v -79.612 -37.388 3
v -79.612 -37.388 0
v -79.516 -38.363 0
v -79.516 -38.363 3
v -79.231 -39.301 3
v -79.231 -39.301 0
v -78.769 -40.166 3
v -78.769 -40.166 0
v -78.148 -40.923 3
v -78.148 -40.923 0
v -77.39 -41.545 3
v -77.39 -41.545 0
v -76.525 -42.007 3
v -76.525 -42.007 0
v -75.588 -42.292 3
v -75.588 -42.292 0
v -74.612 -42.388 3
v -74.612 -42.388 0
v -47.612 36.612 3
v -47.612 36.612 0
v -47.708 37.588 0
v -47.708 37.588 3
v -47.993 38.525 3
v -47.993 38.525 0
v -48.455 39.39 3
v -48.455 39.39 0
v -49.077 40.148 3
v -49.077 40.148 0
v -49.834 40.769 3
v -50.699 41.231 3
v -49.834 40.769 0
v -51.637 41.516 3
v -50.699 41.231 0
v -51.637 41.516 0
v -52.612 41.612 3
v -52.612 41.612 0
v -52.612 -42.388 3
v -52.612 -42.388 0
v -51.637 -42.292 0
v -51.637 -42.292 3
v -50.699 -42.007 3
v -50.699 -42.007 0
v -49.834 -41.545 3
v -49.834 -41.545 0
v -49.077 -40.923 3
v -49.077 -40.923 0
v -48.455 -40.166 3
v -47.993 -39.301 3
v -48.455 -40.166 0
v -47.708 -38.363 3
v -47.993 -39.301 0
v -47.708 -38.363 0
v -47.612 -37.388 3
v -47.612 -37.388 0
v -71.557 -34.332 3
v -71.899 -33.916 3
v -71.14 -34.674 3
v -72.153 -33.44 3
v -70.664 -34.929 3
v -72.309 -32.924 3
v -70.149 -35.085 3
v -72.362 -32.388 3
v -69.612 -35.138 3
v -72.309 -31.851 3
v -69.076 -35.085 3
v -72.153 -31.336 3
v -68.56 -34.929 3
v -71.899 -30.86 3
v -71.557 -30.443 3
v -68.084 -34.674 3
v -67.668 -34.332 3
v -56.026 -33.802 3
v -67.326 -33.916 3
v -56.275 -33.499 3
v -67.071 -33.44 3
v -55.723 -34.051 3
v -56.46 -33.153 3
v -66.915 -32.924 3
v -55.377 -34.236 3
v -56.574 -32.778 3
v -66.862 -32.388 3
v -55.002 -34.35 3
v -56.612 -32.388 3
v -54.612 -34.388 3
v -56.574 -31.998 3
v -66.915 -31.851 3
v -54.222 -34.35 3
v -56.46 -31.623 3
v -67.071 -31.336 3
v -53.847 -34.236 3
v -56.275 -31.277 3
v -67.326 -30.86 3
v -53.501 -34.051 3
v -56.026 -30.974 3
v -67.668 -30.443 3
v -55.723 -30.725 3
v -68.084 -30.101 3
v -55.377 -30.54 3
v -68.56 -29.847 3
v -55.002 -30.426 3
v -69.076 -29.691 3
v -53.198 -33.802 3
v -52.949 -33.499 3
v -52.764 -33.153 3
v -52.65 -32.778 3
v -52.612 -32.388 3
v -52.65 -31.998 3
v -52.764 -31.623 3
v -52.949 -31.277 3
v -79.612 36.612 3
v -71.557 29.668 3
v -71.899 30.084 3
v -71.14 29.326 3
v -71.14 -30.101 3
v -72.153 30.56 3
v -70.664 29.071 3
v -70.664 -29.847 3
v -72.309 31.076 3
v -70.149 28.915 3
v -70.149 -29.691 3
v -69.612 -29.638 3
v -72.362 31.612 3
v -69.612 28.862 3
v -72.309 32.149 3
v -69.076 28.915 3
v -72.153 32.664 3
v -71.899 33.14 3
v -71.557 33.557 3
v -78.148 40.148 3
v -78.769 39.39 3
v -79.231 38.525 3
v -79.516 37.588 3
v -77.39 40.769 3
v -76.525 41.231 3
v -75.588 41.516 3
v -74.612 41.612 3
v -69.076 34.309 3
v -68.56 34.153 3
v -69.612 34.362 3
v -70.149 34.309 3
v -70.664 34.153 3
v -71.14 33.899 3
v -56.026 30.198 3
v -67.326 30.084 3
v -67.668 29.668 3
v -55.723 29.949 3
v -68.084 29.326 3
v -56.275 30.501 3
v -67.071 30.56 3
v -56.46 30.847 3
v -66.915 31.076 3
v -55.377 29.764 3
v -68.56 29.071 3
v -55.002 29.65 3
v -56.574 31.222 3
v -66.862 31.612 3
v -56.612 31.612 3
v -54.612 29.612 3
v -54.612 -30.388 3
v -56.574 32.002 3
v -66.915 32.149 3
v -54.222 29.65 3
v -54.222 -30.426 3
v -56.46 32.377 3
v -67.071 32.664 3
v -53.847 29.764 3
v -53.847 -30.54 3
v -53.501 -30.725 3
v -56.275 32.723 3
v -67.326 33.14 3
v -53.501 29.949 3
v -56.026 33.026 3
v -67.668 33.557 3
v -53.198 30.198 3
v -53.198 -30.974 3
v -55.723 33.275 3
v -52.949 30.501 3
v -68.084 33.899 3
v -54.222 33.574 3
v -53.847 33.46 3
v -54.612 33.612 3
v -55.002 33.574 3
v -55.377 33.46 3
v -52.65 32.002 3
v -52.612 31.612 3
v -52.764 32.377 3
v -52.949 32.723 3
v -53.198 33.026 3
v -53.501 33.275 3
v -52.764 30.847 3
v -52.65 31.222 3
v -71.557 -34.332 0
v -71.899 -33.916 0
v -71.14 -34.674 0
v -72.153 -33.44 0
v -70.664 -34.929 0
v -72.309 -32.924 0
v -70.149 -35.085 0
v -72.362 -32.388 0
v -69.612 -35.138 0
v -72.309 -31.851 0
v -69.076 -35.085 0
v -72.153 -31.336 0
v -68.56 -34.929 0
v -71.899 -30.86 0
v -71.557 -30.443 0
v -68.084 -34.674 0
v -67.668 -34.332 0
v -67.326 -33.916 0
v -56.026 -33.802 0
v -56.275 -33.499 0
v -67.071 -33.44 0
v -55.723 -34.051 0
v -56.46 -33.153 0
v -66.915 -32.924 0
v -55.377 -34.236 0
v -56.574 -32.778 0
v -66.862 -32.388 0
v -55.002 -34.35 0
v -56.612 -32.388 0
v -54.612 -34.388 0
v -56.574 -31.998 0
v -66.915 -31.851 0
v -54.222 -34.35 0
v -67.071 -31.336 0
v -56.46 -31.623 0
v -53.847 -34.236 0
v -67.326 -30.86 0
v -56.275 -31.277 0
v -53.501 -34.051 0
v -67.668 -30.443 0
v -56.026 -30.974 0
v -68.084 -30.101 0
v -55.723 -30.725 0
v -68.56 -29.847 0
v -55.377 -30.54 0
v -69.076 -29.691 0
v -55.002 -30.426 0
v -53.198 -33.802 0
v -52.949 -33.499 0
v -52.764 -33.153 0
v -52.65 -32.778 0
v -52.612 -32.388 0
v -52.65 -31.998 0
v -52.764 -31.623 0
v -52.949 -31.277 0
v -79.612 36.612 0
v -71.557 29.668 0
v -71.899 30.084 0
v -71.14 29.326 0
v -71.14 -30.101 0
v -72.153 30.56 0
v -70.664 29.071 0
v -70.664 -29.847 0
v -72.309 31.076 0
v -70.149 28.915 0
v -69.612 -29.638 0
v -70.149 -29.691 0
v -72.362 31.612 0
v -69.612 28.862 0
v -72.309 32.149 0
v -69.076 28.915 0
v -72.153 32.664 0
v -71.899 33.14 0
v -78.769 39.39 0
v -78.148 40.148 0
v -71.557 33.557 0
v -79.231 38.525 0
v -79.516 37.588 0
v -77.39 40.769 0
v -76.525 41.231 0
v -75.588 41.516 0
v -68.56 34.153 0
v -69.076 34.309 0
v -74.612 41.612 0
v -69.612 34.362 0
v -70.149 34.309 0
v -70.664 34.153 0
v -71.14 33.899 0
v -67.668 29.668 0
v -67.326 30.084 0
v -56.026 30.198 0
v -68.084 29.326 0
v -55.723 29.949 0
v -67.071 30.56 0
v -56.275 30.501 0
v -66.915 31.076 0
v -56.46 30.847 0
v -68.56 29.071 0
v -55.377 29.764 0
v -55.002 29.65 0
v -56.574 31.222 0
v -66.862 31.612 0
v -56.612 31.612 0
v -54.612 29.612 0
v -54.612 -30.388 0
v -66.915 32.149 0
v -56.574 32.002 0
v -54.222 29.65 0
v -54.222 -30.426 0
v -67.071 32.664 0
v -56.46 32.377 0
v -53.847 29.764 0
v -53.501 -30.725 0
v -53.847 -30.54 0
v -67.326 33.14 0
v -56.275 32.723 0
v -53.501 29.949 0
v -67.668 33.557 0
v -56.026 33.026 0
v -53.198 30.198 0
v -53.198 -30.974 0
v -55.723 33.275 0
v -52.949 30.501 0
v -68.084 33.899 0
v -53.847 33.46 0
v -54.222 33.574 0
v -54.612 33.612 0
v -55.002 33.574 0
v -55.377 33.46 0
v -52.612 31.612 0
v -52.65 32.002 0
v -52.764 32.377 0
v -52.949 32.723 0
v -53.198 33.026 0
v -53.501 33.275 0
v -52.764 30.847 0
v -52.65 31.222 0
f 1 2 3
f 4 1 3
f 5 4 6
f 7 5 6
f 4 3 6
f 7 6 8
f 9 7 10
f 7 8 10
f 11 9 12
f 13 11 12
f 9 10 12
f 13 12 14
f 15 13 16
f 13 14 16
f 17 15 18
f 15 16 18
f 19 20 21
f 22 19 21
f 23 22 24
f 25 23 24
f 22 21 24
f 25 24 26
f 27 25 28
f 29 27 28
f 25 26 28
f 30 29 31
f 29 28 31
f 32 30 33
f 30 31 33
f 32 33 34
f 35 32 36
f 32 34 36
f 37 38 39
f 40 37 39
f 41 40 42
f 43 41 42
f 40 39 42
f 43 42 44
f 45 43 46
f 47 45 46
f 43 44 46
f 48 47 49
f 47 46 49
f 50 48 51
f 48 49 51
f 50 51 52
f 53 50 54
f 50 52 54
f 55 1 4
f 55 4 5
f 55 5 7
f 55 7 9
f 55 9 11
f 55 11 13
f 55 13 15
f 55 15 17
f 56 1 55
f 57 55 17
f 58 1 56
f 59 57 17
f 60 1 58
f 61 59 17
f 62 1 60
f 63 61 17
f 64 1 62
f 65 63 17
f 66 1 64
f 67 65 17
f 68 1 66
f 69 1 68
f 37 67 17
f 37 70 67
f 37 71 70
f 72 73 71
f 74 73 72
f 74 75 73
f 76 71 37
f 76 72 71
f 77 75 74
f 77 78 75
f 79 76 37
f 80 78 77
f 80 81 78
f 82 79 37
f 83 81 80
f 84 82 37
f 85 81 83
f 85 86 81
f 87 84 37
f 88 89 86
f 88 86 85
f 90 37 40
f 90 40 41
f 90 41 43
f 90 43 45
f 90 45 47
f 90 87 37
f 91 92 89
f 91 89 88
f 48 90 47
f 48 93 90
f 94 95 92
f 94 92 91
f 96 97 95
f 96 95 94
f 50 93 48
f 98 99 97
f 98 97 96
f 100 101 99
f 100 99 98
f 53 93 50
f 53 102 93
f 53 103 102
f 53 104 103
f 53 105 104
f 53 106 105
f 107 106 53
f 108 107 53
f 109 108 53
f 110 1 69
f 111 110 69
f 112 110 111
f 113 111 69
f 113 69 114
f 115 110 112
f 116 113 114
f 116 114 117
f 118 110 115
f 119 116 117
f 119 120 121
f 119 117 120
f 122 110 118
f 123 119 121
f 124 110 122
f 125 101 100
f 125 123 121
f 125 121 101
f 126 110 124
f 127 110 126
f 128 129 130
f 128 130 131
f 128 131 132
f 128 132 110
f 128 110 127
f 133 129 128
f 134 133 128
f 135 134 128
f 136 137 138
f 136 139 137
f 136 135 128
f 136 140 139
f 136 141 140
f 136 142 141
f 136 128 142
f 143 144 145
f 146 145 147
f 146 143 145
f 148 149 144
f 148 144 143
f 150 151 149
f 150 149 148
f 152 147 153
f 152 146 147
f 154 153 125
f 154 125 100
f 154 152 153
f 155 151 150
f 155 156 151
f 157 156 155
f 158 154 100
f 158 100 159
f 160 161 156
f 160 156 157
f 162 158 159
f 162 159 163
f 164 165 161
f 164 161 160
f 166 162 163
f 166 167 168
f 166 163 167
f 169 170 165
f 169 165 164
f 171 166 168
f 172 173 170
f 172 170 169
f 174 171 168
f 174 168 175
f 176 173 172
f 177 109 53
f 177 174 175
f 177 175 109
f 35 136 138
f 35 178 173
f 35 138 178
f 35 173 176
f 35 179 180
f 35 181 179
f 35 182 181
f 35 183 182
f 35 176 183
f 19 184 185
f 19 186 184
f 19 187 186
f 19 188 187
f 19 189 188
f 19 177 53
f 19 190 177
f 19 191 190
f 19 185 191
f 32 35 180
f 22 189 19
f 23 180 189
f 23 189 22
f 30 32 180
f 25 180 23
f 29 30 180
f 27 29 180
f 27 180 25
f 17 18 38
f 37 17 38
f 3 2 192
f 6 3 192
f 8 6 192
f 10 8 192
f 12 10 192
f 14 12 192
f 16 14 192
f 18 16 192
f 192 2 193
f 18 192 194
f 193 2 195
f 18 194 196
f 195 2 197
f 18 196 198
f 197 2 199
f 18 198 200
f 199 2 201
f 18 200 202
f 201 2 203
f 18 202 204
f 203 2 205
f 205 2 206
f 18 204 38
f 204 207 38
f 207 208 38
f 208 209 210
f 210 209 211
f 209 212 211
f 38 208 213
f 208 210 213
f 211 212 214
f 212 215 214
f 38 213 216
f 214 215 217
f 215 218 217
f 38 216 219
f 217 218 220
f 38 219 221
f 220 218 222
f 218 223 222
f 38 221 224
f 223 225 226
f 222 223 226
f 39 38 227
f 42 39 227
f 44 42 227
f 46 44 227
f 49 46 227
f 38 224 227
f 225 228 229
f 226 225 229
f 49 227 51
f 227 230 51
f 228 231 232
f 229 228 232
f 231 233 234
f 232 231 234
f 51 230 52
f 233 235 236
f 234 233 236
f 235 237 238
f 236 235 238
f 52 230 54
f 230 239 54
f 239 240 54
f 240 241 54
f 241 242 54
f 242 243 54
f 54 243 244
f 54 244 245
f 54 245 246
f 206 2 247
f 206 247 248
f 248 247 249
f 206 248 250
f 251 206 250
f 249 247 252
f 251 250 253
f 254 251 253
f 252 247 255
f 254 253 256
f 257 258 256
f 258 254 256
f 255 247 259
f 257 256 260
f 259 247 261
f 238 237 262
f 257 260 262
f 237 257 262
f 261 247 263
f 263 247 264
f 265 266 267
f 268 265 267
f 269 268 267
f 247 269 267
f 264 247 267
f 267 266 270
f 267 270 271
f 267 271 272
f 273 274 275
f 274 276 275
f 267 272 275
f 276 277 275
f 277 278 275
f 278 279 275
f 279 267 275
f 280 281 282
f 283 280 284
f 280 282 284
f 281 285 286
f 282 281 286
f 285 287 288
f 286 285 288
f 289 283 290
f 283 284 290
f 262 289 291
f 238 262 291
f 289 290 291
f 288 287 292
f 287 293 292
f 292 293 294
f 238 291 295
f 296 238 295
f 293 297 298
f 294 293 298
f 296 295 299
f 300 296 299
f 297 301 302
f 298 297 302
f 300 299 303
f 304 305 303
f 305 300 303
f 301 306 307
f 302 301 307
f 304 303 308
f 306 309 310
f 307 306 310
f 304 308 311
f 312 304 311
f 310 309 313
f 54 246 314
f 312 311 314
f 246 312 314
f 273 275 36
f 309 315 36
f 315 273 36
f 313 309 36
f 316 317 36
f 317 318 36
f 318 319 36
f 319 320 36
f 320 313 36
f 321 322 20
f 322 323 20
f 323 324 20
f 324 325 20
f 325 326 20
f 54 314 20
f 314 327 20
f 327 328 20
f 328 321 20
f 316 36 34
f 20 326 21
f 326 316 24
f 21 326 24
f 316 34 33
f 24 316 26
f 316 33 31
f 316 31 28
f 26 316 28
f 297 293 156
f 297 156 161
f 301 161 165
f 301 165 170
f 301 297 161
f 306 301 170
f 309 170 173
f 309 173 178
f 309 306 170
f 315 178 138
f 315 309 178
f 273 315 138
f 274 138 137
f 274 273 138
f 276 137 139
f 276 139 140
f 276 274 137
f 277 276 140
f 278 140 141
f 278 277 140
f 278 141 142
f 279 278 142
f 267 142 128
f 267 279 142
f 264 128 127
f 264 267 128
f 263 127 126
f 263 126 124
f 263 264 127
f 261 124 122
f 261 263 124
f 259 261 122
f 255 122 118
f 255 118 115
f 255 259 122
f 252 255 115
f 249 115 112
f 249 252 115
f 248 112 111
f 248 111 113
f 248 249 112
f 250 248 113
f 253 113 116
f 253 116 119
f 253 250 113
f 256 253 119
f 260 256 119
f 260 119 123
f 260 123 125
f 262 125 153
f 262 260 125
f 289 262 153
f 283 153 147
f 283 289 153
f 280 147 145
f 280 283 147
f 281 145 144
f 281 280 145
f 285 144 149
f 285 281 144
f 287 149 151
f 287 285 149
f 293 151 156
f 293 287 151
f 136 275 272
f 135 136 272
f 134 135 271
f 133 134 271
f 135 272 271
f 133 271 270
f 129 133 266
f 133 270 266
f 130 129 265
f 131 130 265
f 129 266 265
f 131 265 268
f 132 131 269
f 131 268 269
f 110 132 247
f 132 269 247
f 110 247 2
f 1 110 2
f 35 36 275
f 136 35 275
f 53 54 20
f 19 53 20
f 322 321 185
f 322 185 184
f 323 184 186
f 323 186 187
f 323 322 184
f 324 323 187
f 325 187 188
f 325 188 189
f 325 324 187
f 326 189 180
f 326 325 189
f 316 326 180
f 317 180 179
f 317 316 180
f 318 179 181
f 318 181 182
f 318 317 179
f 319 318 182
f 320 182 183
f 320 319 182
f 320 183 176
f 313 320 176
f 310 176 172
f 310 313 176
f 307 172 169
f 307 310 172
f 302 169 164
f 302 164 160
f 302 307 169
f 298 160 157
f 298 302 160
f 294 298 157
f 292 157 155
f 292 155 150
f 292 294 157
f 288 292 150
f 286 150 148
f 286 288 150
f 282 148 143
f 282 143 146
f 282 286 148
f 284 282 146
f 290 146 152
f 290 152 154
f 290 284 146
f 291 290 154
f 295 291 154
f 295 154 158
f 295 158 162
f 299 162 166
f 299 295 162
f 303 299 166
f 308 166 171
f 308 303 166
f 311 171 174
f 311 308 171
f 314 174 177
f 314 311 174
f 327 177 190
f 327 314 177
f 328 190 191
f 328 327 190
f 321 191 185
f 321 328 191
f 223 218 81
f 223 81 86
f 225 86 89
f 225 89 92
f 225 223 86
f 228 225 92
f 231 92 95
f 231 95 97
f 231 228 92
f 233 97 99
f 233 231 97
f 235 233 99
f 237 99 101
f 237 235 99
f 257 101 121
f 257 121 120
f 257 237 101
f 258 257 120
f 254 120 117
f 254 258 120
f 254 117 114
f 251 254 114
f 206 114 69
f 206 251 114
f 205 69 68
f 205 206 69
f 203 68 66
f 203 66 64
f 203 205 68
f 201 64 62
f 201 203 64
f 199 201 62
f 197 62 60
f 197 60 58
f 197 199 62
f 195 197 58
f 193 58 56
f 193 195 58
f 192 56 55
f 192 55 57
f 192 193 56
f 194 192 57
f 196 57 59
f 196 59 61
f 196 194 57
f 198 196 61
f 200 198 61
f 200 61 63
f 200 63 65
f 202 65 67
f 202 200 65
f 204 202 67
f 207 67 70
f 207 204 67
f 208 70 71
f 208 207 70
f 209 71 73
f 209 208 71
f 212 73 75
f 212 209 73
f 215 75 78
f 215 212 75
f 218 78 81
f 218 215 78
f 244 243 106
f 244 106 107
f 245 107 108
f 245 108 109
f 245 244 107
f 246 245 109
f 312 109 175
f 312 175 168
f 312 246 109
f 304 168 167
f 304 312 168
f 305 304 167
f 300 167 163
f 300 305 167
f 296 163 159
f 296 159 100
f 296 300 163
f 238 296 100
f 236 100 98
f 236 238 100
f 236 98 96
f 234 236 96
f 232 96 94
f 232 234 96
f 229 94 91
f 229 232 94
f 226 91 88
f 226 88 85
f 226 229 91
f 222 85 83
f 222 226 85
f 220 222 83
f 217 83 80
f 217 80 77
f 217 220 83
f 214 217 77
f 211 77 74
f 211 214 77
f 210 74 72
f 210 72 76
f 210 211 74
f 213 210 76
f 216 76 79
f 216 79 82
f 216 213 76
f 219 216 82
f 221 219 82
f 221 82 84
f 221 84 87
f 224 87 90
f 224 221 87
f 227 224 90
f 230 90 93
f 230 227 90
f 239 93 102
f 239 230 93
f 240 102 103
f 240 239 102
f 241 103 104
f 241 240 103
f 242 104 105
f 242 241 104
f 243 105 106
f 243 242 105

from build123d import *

# Parameters (mm, degrees)
F0_R     = 2.75
F0_R_2   = 2
F1_DEPTH = 3
F2_DEPTH = 3


with BuildPart() as f1:
    # F0 (on Top) → F1 (new body)
    with BuildSketch(Plane.XY):
        with BuildLine():
            Line((-79.612069, -8.387931), (-79.612069, -22.387931))
            Line((-79.612069, -22.387931), (-79.612069, -37.387931))
            ThreePointArc((-79.612069, -37.387931), (-78.147603, -40.923465), (-74.612069, -42.387931))
            Line((-74.612069, -42.387931), (-64.612069, -42.387931))
            Line((-64.612069, -42.387931), (-52.612069, -42.387931))
            ThreePointArc((-52.612069, -42.387931), (-49.076535, -40.923465), (-47.612069, -37.387931))
            Line((-47.612069, -37.387931), (-47.612069, 36.612069))
            ThreePointArc((-47.612069, 36.612069), (-49.076535, 40.147603), (-52.612069, 41.612069))
            Line((-52.612069, 41.612069), (-64.612069, 41.612069))
            Line((-64.612069, 41.612069), (-67.112069, 41.612069))
            Line((-67.112069, 41.612069), (-74.612069, 41.612069))
            ThreePointArc((-74.612069, 41.612069), (-78.147603, 40.147603), (-79.612069, 36.612069))
            Line((-79.612069, 36.612069), (-79.612069, 21.612069))
            Line((-79.612069, 21.612069), (-79.612069, -8.387931))
        make_face()
        with Locations((-69.612069, -32.387931)):
            Circle(F0_R, mode=Mode.SUBTRACT)
        with Locations((-54.612069, -32.387931)):
            Circle(F0_R_2, mode=Mode.SUBTRACT)
        with Locations((-69.612069, 31.612069)):
            Circle(F0_R, mode=Mode.SUBTRACT)
        with Locations((-54.612069, 31.612069)):
            Circle(F0_R_2, mode=Mode.SUBTRACT)
    extrude(amount=F1_DEPTH)


with BuildPart() as f2:
    # F0 (on Top) → F2 (new body)
    with BuildSketch(Plane.XY):
        with BuildLine():
            Line((74.387931, -13.387931), (74.387931, -8.387931))
            Line((74.387931, -8.387931), (74.387931, 21.612069))
            Line((74.387931, 21.612069), (74.387931, 36.612069))
            ThreePointArc((74.387931, 36.612069), (72.923465, 40.147603), (69.387931, 41.612069))
            Line((69.387931, 41.612069), (59.387931, 41.612069))
            Line((59.387931, 41.612069), (52.387931, 41.612069))
            ThreePointArc((52.387931, 41.612069), (48.852397, 40.147603), (47.387931, 36.612069))
            Line((47.387931, 36.612069), (47.387931, -37.387931))
            ThreePointArc((47.387931, -37.387931), (48.852397, -40.923465), (52.387931, -42.387931))
            Line((52.387931, -42.387931), (59.387931, -42.387931))
            Line((59.387931, -42.387931), (69.387931, -42.387931))
            ThreePointArc((69.387931, -42.387931), (72.923465, -40.923465), (74.387931, -37.387931))
            Line((74.387931, -37.387931), (74.387931, -28.387931))
            Line((74.387931, -28.387931), (74.387931, -22.387931))
            Line((74.387931, -22.387931), (74.387931, -13.387931))
        make_face()
        with Locations((54.387931, -32.387931)):
            Circle(F0_R_2, mode=Mode.SUBTRACT)
        with Locations((64.387931, -32.387931)):
            Circle(F0_R, mode=Mode.SUBTRACT)
        with Locations((54.387931, 31.612069)):
            Circle(F0_R_2, mode=Mode.SUBTRACT)
        with Locations((64.387931, 31.612069)):
            Circle(F0_R, mode=Mode.SUBTRACT)
    extrude(amount=F2_DEPTH)


solid = f1.part
